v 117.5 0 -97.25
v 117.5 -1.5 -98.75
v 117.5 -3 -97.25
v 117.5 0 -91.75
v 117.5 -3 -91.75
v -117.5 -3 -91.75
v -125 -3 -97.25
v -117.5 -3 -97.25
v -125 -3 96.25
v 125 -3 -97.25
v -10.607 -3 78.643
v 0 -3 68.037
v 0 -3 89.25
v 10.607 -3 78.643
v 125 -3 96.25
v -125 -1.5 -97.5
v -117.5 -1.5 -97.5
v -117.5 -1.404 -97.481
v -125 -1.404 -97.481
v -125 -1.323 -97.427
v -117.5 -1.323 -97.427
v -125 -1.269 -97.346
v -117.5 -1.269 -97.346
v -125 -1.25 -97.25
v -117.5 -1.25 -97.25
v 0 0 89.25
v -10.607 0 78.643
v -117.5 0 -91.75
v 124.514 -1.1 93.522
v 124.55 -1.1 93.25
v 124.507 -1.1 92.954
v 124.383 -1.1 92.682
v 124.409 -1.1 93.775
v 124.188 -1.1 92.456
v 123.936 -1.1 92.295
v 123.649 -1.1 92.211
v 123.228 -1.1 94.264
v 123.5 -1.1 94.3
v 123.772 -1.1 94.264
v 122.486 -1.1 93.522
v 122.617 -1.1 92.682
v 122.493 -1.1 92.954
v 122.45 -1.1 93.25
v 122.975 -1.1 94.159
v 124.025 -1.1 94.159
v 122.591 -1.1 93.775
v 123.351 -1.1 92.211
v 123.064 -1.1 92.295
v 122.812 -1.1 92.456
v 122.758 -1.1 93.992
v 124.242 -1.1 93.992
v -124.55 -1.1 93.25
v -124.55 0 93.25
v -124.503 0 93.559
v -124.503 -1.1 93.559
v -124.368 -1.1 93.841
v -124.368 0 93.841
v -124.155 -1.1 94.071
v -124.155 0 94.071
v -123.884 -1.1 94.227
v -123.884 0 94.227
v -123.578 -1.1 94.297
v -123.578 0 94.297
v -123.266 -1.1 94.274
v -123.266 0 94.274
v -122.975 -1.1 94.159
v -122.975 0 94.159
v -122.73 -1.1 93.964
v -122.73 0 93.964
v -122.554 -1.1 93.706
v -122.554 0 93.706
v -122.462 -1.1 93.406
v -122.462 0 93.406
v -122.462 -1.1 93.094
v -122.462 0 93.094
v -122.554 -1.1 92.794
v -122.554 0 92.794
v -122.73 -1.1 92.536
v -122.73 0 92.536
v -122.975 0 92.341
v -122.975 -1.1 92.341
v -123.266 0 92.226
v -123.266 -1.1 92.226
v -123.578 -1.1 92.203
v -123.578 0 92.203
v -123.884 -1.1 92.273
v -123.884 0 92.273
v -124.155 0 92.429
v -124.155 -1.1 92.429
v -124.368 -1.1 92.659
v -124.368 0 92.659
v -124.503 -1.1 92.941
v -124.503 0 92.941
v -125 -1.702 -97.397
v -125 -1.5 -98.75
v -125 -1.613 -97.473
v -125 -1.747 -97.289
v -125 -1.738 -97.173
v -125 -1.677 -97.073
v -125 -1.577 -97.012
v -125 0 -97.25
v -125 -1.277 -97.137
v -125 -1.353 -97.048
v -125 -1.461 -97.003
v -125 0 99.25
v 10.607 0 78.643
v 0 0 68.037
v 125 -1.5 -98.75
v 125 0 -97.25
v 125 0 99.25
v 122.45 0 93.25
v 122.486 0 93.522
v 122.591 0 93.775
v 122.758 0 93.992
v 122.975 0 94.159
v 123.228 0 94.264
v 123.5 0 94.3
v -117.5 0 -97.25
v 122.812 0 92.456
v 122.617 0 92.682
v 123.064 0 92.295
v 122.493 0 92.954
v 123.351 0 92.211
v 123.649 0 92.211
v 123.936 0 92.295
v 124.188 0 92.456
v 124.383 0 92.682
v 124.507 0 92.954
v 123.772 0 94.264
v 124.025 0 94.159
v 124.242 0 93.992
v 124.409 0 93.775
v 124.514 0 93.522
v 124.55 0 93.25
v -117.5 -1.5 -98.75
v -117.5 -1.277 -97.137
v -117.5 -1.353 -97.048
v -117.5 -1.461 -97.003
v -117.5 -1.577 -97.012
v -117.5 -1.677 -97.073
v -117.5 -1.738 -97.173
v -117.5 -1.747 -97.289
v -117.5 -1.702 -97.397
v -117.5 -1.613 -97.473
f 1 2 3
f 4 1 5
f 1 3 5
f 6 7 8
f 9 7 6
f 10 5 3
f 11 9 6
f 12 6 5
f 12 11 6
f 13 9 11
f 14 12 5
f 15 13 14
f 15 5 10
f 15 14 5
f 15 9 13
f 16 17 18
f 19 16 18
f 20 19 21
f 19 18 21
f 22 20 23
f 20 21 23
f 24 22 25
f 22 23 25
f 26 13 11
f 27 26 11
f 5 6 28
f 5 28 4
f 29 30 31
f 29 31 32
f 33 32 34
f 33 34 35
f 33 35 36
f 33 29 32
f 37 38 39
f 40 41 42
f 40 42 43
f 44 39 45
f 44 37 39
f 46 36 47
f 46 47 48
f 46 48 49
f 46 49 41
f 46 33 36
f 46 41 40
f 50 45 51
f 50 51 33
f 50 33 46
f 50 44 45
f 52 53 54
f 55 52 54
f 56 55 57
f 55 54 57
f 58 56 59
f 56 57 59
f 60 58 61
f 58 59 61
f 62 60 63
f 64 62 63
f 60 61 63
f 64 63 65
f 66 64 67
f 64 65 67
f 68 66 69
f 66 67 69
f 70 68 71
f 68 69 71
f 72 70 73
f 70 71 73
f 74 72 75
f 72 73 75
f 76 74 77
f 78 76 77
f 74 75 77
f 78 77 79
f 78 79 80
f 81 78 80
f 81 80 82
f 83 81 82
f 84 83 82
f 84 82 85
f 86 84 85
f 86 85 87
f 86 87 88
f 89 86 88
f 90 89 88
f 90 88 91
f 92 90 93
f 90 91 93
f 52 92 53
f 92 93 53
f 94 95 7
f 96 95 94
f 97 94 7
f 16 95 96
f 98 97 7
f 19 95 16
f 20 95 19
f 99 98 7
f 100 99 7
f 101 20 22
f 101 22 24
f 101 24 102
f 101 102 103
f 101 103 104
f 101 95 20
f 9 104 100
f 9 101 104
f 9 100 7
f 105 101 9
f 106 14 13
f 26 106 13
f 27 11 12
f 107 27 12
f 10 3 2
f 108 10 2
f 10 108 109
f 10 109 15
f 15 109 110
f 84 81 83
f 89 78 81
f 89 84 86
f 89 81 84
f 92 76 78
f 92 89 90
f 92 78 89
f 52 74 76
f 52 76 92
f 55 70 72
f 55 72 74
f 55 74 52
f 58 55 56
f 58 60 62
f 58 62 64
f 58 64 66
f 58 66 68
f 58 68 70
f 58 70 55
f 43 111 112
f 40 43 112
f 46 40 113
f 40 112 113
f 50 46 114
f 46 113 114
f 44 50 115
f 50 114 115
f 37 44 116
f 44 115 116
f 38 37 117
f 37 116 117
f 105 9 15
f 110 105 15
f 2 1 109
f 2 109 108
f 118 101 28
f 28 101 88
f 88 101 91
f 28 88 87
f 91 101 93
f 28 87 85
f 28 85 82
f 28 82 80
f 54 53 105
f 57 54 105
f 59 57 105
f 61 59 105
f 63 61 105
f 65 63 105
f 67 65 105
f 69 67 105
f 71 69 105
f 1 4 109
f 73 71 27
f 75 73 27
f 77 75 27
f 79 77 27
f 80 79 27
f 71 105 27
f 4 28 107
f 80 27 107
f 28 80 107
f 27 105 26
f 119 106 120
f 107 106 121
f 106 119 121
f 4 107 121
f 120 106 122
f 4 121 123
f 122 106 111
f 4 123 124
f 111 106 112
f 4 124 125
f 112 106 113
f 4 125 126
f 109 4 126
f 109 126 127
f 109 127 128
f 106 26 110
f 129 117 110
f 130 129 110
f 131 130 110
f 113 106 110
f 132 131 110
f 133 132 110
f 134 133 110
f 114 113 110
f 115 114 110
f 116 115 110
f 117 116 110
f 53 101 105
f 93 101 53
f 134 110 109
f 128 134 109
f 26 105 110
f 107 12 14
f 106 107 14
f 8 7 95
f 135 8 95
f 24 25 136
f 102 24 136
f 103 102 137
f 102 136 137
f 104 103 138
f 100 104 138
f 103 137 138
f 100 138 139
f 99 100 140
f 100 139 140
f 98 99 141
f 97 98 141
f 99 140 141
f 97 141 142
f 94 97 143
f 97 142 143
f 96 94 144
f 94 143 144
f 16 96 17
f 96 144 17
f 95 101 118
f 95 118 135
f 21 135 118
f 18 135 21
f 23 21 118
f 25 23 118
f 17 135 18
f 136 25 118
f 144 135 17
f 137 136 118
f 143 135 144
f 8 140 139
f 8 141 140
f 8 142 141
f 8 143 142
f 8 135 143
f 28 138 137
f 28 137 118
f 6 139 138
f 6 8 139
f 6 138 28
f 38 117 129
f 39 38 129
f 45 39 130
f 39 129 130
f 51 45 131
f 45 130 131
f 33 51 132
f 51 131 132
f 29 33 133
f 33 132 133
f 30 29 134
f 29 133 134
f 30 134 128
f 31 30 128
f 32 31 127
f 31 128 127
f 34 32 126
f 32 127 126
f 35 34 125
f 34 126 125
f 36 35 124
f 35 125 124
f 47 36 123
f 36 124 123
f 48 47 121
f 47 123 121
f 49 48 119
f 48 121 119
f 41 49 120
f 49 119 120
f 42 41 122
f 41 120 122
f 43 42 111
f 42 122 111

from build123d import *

# Parameters (mm, degrees)
F0_W        = 250
F0_H        = 198.5
F1_DEPTH    = 3
F2_W        = 235
F2_H        = 7.5
F3_DEPTH    = 30
F5_DEPTH    = 300
F6_T1_DEPTH = 17.7867319519
F6_T3_DEPTH = 17.7867319519
F8_DEPTH    = 25
F9_SIZE     = 2.99999
F10_R       = 1.05
F11_DEPTH   = 1.1


# Not quite as in the source:
# - a fillet or chamfer that OpenCascade refuses, or shapes differently, is made with other operations: its cross-section is extruded or revolved along the edge and cut away or added
# - a fillet or chamfer is up to 0.001 mm smaller than in the source, because OpenCascade refuses the exact size


with BuildPart() as f1:
    # F0 (on Front) → F1 (new body)
    with BuildSketch(Plane.XZ):
        Rectangle(F0_W, F0_H)
    extrude(amount=F1_DEPTH)

    # F2 (on face) → F3 (cut)
    with BuildSketch(Plane.XZ.offset(3)):
        with Locations((0, -95.5)):
            Rectangle(F2_W, F2_H)
    extrude(amount=-F3_DEPTH, mode=Mode.SUBTRACT)

    # F4 (on face) → F5 (cut)
    with BuildSketch(Plane.YZ.offset(-117.5)):
        with BuildLine():
            ThreePointArc((-1.25, -97.25), (-1.6767766953, -97.0732233047), (-1.5, -97.5))
            ThreePointArc((-1.5, -97.5), (-1.3232233047, -97.4267766953), (-1.25, -97.25))
        make_face()
    extrude(amount=-F5_DEPTH, mode=Mode.SUBTRACT)

    # F6: chamfer of 2 on 4 edges, made by hand

    # F6_s2 → F6_t1 (cut)
    with BuildSketch(Plane.YZ.offset(-130.1433659759)):
        Polygon((-3, -97.25), (-1, -99.25), (-3, -99.25), align=None)
        Polygon((0, -97.25), (-2, -99.25), (0, -99.25), align=None)
    extrude(amount=F6_T1_DEPTH, mode=Mode.SUBTRACT)

    # F6_s4 → F6_t3 (cut)
    with BuildSketch(Plane.YZ.offset(112.3566340241)):
        Polygon((-3, -97.25), (-1, -99.25), (-3, -99.25), align=None)
        Polygon((0, -97.25), (-2, -99.25), (0, -99.25), align=None)
    extrude(amount=F6_T3_DEPTH, mode=Mode.SUBTRACT)

    # F7 (on face) → F8 (cut)
    with BuildSketch(Plane.XZ.offset(3)):
        Polygon((0, 89.25), (-10.6066017178, 78.6433982822), (0, 68.0367965644), (10.6066017178, 78.6433982822), align=None)
    extrude(amount=-F8_DEPTH, mode=Mode.SUBTRACT)

    # F9 (size 3 in the source; OpenCascade refuses exactly that, so slightly less here)
    f9_edges = [f1.edges().sort_by_distance(p)[0] for p in [
        (0, -3, 99.25),
    ]]
    chamfer(f9_edges, length=F9_SIZE)

    # F10 (on face) → F11 (cut)
    with BuildSketch(Plane(origin=(0, 0, 0), x_dir=(-1, 0, 0), z_dir=(0, 1, 0))):
        with BuildLine():
            Line((-122.45, 93.25), (-123.5, 93.25))
            Line((-123.5, 93.25), (-124.55, 93.25))
            ThreePointArc((-124.55, 93.25), (-123.5, 92.2), (-122.45, 93.25))
        make_face()
        with BuildLine():
            Line((-123.5, 94.3), (-123.5, 93.25))
            Line((-123.5, 93.25), (-122.45, 93.25))
            ThreePointArc((-122.45, 93.25), (-122.7575378798, 93.9924621202), (-123.5, 94.3))
        make_face()
        with BuildLine():
            Line((-124.55, 93.25), (-123.5, 93.25))
            Line((-123.5, 93.25), (-123.5, 94.3))
            ThreePointArc((-123.5, 94.3), (-124.2424621202, 93.9924621202), (-124.55, 93.25))
        make_face()
        with Locations((123.5, 93.25)):
            Circle(F10_R)
    extrude(amount=-F11_DEPTH, mode=Mode.SUBTRACT)


solid = f1.part
